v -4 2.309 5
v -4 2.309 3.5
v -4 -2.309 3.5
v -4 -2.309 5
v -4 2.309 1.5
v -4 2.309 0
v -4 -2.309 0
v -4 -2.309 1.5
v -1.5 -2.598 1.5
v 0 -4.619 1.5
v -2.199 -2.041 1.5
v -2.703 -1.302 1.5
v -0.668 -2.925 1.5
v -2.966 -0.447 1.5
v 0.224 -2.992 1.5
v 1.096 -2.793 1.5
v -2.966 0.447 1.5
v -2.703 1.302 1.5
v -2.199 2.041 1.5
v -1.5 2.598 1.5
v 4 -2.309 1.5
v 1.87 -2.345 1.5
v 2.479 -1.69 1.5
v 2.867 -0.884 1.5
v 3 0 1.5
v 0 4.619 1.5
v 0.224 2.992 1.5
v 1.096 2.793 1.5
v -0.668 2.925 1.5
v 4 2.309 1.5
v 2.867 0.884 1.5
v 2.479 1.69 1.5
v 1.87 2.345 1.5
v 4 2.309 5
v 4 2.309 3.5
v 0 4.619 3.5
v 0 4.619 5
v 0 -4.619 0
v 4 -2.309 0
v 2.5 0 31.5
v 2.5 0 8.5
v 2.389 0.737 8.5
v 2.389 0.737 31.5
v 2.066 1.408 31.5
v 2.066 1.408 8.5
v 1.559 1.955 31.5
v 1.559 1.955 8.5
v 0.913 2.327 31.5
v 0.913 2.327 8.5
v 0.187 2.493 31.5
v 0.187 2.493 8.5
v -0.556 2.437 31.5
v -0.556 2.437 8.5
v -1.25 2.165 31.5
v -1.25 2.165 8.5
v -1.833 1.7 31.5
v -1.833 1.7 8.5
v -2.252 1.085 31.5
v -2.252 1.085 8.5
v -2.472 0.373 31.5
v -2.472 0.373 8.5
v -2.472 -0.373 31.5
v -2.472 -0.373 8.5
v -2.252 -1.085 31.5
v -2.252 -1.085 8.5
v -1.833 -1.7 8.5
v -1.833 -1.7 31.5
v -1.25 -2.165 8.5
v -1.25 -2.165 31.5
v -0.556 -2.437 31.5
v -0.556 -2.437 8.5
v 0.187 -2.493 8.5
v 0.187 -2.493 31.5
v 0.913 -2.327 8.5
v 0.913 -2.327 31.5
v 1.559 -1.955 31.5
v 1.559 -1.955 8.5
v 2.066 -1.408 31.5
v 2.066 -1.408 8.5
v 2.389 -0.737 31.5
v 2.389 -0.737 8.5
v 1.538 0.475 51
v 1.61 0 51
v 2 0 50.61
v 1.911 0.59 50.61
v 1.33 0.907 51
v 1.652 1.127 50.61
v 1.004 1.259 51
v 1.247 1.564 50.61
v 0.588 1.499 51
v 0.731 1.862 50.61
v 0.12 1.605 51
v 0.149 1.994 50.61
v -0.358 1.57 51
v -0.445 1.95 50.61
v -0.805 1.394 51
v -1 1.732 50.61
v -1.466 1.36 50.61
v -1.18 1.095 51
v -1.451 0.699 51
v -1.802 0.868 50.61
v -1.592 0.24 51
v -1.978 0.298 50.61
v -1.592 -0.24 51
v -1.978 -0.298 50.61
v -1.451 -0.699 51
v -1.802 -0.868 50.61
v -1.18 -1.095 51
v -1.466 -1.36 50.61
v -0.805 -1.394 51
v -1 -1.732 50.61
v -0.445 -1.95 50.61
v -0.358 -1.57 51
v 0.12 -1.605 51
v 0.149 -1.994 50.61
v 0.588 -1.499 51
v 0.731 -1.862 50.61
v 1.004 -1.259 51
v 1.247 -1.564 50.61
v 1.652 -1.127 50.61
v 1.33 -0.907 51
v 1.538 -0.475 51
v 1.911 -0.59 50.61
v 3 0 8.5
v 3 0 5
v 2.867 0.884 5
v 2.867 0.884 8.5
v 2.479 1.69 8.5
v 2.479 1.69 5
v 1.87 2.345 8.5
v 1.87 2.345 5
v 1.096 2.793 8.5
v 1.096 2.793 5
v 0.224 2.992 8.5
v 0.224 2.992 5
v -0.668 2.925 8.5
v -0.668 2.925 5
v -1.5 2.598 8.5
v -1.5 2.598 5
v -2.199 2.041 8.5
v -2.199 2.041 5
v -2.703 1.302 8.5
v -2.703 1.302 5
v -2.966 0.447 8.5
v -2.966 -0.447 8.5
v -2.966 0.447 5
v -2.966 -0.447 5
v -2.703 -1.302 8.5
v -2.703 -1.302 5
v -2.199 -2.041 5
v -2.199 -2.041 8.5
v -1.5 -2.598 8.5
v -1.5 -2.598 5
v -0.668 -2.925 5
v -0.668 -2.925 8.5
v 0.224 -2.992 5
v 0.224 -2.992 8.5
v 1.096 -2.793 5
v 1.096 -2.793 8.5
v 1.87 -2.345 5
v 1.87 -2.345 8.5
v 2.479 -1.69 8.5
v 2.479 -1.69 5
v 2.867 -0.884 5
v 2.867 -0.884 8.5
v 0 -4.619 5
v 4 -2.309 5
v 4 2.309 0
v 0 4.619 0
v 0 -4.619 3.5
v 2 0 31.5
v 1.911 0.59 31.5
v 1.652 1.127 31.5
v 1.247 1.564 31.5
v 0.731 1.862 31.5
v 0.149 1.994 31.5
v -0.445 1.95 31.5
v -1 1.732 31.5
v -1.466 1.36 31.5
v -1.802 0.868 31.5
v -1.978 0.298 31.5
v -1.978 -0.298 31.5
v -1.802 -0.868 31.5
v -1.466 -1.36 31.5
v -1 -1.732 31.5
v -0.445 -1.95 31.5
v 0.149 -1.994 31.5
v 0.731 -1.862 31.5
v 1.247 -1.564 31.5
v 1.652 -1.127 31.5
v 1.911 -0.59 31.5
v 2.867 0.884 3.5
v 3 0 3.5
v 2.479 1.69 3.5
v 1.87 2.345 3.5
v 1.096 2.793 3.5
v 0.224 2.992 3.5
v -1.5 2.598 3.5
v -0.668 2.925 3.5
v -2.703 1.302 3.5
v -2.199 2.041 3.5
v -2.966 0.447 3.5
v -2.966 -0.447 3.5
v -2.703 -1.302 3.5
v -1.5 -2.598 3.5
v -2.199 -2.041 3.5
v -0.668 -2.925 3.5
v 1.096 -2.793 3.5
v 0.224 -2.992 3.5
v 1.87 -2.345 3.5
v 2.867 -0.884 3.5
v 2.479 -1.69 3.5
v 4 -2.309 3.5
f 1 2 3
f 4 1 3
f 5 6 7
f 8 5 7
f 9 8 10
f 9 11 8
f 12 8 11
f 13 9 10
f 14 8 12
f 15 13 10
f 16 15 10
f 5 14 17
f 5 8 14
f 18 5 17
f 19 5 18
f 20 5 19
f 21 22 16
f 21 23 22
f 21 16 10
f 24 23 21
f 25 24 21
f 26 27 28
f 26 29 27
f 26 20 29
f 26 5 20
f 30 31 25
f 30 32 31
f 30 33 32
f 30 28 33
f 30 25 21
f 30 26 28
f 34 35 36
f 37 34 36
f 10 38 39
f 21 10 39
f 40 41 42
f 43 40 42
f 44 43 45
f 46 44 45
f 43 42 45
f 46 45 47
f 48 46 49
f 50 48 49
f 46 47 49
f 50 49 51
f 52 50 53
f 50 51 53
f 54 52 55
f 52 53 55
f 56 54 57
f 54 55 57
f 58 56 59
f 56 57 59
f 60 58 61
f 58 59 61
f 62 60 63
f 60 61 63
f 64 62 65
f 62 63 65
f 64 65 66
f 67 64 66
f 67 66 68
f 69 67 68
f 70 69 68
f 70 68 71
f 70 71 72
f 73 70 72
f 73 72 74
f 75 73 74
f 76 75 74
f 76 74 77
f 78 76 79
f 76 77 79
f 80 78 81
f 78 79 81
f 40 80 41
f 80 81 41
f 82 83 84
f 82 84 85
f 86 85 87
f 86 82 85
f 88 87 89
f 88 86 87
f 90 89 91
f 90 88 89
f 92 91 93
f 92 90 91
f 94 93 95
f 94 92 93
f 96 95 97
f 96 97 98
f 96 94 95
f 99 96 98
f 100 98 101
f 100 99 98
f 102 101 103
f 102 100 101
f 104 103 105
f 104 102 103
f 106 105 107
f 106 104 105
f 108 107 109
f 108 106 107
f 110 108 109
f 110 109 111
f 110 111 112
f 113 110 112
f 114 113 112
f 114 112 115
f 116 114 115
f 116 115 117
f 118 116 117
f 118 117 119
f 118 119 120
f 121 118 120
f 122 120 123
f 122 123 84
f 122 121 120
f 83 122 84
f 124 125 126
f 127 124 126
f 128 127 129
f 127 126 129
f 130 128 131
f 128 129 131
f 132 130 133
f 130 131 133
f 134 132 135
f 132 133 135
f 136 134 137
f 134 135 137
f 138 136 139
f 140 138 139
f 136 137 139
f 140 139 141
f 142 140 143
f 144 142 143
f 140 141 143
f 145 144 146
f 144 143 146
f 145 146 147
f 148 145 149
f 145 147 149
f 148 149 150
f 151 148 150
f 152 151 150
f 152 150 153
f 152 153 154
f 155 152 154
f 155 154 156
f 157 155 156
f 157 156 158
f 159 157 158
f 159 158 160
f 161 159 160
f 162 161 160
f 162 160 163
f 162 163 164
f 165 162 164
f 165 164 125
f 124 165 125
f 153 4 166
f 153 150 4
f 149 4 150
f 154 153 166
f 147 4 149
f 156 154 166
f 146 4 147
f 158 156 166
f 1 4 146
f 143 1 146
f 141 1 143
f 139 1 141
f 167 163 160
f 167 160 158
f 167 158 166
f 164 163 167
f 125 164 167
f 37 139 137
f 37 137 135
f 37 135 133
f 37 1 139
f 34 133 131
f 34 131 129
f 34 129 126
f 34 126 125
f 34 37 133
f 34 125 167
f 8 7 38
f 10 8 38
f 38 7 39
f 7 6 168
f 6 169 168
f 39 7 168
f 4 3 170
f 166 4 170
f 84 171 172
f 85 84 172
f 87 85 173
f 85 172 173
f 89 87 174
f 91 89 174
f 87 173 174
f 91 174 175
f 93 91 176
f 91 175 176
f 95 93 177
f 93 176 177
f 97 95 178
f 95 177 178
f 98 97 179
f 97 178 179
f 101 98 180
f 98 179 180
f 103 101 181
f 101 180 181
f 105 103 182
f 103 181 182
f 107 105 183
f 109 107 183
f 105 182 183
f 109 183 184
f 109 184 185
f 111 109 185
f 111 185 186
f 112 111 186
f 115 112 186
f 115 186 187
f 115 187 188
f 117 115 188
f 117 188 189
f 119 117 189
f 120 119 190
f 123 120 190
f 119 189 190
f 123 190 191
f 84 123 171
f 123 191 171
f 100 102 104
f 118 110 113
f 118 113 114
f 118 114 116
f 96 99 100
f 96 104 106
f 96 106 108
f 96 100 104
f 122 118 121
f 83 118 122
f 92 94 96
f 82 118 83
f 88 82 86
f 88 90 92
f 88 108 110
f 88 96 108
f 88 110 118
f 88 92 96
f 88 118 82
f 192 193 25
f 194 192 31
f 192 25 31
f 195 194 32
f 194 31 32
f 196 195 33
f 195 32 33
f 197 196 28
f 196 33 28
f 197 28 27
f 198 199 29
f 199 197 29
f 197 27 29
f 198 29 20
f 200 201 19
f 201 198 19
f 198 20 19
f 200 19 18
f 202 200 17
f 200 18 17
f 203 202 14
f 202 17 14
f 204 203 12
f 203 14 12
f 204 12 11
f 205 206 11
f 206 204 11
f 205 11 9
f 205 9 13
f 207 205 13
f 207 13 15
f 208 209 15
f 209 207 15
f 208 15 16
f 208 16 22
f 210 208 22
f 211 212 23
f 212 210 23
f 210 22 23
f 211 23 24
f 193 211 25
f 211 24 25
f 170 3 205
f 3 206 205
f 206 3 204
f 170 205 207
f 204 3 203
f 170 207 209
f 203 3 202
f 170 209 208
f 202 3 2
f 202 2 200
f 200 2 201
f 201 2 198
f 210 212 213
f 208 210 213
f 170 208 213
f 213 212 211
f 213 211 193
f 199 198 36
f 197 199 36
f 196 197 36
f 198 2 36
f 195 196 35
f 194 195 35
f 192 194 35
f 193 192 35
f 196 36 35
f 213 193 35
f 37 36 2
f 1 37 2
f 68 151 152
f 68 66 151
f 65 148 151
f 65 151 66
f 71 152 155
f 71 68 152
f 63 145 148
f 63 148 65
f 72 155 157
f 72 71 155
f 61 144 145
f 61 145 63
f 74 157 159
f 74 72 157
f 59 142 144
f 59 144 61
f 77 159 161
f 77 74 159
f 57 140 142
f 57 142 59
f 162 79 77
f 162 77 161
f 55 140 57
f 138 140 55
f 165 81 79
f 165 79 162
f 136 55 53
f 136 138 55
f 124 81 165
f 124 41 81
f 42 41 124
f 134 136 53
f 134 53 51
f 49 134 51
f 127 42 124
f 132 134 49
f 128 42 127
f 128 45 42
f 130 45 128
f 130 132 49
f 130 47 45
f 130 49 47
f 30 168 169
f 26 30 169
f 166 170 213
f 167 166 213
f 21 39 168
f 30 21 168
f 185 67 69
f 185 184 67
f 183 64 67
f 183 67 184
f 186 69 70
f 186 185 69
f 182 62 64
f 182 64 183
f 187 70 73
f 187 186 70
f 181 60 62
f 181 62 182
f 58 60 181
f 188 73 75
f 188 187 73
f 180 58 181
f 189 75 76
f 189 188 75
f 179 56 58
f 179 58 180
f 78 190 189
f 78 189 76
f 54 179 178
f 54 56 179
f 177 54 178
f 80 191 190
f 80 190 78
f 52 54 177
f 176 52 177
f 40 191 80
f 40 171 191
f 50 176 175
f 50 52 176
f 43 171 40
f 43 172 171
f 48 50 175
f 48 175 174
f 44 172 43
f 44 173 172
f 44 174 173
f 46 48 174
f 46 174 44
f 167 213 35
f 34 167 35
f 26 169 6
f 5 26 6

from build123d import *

# Parameters (mm, degrees)
EXTRUDE_1_DEPTH = 1.5
SKETCH_2_R      = 3
EXTRUDE_2_DEPTH = 7
EXTRUDE_START   = 3.5
EXTRUDE_3_DEPTH = 1.5
SKETCH_3_R      = 2.5
EXTRUDE_4_DEPTH = 23
SKETCH_4_R      = 2
EXTRUDE_5_DEPTH = 19.5
CHAMFER_1_SIZE  = 0.39


with BuildPart() as part:
    # Эскиз1 → Бобышка-Вытянуть1 (new body)
    with BuildSketch(Plane.XY):
        Polygon((-4, 2.309401077), (-4, -2.309401077), (0, -4.618802154), (4, -2.309401077), (4, 2.309401077), (0, 4.618802154), align=None)
    extrude(amount=EXTRUDE_1_DEPTH)

    # Эскиз2 → Бобышка-Вытянуть2 (add)
    with BuildSketch(Plane.XY.offset(1.5)):
        Circle(SKETCH_2_R)
    extrude(amount=EXTRUDE_2_DEPTH)

    # Эскиз1<2> → Бобышка-Вытянуть3 (add)
    with BuildSketch(Plane.XY.offset(EXTRUDE_START)):
        Polygon((-4, 2.309401077), (-4, -2.309401077), (0, -4.618802154), (4, -2.309401077), (4, 2.309401077), (0, 4.618802154), align=None)
    extrude(amount=EXTRUDE_3_DEPTH)

    # Эскиз3 → Бобышка-Вытянуть4 (add)
    with BuildSketch(Plane.XY.offset(8.5)):
        Circle(SKETCH_3_R)
    extrude(amount=EXTRUDE_4_DEPTH)

    # Эскиз4 → Бобышка-Вытянуть5 (add)
    with BuildSketch(Plane.XY.offset(31.5)):
        Circle(SKETCH_4_R)
    extrude(amount=EXTRUDE_5_DEPTH)

    # Фаска1
    chamfer_1_edges = [part.edges().sort_by_distance(p)[0] for p in [
        (-2, 0, 51),
    ]]
    chamfer(chamfer_1_edges, length=CHAMFER_1_SIZE)


solid = part.part
